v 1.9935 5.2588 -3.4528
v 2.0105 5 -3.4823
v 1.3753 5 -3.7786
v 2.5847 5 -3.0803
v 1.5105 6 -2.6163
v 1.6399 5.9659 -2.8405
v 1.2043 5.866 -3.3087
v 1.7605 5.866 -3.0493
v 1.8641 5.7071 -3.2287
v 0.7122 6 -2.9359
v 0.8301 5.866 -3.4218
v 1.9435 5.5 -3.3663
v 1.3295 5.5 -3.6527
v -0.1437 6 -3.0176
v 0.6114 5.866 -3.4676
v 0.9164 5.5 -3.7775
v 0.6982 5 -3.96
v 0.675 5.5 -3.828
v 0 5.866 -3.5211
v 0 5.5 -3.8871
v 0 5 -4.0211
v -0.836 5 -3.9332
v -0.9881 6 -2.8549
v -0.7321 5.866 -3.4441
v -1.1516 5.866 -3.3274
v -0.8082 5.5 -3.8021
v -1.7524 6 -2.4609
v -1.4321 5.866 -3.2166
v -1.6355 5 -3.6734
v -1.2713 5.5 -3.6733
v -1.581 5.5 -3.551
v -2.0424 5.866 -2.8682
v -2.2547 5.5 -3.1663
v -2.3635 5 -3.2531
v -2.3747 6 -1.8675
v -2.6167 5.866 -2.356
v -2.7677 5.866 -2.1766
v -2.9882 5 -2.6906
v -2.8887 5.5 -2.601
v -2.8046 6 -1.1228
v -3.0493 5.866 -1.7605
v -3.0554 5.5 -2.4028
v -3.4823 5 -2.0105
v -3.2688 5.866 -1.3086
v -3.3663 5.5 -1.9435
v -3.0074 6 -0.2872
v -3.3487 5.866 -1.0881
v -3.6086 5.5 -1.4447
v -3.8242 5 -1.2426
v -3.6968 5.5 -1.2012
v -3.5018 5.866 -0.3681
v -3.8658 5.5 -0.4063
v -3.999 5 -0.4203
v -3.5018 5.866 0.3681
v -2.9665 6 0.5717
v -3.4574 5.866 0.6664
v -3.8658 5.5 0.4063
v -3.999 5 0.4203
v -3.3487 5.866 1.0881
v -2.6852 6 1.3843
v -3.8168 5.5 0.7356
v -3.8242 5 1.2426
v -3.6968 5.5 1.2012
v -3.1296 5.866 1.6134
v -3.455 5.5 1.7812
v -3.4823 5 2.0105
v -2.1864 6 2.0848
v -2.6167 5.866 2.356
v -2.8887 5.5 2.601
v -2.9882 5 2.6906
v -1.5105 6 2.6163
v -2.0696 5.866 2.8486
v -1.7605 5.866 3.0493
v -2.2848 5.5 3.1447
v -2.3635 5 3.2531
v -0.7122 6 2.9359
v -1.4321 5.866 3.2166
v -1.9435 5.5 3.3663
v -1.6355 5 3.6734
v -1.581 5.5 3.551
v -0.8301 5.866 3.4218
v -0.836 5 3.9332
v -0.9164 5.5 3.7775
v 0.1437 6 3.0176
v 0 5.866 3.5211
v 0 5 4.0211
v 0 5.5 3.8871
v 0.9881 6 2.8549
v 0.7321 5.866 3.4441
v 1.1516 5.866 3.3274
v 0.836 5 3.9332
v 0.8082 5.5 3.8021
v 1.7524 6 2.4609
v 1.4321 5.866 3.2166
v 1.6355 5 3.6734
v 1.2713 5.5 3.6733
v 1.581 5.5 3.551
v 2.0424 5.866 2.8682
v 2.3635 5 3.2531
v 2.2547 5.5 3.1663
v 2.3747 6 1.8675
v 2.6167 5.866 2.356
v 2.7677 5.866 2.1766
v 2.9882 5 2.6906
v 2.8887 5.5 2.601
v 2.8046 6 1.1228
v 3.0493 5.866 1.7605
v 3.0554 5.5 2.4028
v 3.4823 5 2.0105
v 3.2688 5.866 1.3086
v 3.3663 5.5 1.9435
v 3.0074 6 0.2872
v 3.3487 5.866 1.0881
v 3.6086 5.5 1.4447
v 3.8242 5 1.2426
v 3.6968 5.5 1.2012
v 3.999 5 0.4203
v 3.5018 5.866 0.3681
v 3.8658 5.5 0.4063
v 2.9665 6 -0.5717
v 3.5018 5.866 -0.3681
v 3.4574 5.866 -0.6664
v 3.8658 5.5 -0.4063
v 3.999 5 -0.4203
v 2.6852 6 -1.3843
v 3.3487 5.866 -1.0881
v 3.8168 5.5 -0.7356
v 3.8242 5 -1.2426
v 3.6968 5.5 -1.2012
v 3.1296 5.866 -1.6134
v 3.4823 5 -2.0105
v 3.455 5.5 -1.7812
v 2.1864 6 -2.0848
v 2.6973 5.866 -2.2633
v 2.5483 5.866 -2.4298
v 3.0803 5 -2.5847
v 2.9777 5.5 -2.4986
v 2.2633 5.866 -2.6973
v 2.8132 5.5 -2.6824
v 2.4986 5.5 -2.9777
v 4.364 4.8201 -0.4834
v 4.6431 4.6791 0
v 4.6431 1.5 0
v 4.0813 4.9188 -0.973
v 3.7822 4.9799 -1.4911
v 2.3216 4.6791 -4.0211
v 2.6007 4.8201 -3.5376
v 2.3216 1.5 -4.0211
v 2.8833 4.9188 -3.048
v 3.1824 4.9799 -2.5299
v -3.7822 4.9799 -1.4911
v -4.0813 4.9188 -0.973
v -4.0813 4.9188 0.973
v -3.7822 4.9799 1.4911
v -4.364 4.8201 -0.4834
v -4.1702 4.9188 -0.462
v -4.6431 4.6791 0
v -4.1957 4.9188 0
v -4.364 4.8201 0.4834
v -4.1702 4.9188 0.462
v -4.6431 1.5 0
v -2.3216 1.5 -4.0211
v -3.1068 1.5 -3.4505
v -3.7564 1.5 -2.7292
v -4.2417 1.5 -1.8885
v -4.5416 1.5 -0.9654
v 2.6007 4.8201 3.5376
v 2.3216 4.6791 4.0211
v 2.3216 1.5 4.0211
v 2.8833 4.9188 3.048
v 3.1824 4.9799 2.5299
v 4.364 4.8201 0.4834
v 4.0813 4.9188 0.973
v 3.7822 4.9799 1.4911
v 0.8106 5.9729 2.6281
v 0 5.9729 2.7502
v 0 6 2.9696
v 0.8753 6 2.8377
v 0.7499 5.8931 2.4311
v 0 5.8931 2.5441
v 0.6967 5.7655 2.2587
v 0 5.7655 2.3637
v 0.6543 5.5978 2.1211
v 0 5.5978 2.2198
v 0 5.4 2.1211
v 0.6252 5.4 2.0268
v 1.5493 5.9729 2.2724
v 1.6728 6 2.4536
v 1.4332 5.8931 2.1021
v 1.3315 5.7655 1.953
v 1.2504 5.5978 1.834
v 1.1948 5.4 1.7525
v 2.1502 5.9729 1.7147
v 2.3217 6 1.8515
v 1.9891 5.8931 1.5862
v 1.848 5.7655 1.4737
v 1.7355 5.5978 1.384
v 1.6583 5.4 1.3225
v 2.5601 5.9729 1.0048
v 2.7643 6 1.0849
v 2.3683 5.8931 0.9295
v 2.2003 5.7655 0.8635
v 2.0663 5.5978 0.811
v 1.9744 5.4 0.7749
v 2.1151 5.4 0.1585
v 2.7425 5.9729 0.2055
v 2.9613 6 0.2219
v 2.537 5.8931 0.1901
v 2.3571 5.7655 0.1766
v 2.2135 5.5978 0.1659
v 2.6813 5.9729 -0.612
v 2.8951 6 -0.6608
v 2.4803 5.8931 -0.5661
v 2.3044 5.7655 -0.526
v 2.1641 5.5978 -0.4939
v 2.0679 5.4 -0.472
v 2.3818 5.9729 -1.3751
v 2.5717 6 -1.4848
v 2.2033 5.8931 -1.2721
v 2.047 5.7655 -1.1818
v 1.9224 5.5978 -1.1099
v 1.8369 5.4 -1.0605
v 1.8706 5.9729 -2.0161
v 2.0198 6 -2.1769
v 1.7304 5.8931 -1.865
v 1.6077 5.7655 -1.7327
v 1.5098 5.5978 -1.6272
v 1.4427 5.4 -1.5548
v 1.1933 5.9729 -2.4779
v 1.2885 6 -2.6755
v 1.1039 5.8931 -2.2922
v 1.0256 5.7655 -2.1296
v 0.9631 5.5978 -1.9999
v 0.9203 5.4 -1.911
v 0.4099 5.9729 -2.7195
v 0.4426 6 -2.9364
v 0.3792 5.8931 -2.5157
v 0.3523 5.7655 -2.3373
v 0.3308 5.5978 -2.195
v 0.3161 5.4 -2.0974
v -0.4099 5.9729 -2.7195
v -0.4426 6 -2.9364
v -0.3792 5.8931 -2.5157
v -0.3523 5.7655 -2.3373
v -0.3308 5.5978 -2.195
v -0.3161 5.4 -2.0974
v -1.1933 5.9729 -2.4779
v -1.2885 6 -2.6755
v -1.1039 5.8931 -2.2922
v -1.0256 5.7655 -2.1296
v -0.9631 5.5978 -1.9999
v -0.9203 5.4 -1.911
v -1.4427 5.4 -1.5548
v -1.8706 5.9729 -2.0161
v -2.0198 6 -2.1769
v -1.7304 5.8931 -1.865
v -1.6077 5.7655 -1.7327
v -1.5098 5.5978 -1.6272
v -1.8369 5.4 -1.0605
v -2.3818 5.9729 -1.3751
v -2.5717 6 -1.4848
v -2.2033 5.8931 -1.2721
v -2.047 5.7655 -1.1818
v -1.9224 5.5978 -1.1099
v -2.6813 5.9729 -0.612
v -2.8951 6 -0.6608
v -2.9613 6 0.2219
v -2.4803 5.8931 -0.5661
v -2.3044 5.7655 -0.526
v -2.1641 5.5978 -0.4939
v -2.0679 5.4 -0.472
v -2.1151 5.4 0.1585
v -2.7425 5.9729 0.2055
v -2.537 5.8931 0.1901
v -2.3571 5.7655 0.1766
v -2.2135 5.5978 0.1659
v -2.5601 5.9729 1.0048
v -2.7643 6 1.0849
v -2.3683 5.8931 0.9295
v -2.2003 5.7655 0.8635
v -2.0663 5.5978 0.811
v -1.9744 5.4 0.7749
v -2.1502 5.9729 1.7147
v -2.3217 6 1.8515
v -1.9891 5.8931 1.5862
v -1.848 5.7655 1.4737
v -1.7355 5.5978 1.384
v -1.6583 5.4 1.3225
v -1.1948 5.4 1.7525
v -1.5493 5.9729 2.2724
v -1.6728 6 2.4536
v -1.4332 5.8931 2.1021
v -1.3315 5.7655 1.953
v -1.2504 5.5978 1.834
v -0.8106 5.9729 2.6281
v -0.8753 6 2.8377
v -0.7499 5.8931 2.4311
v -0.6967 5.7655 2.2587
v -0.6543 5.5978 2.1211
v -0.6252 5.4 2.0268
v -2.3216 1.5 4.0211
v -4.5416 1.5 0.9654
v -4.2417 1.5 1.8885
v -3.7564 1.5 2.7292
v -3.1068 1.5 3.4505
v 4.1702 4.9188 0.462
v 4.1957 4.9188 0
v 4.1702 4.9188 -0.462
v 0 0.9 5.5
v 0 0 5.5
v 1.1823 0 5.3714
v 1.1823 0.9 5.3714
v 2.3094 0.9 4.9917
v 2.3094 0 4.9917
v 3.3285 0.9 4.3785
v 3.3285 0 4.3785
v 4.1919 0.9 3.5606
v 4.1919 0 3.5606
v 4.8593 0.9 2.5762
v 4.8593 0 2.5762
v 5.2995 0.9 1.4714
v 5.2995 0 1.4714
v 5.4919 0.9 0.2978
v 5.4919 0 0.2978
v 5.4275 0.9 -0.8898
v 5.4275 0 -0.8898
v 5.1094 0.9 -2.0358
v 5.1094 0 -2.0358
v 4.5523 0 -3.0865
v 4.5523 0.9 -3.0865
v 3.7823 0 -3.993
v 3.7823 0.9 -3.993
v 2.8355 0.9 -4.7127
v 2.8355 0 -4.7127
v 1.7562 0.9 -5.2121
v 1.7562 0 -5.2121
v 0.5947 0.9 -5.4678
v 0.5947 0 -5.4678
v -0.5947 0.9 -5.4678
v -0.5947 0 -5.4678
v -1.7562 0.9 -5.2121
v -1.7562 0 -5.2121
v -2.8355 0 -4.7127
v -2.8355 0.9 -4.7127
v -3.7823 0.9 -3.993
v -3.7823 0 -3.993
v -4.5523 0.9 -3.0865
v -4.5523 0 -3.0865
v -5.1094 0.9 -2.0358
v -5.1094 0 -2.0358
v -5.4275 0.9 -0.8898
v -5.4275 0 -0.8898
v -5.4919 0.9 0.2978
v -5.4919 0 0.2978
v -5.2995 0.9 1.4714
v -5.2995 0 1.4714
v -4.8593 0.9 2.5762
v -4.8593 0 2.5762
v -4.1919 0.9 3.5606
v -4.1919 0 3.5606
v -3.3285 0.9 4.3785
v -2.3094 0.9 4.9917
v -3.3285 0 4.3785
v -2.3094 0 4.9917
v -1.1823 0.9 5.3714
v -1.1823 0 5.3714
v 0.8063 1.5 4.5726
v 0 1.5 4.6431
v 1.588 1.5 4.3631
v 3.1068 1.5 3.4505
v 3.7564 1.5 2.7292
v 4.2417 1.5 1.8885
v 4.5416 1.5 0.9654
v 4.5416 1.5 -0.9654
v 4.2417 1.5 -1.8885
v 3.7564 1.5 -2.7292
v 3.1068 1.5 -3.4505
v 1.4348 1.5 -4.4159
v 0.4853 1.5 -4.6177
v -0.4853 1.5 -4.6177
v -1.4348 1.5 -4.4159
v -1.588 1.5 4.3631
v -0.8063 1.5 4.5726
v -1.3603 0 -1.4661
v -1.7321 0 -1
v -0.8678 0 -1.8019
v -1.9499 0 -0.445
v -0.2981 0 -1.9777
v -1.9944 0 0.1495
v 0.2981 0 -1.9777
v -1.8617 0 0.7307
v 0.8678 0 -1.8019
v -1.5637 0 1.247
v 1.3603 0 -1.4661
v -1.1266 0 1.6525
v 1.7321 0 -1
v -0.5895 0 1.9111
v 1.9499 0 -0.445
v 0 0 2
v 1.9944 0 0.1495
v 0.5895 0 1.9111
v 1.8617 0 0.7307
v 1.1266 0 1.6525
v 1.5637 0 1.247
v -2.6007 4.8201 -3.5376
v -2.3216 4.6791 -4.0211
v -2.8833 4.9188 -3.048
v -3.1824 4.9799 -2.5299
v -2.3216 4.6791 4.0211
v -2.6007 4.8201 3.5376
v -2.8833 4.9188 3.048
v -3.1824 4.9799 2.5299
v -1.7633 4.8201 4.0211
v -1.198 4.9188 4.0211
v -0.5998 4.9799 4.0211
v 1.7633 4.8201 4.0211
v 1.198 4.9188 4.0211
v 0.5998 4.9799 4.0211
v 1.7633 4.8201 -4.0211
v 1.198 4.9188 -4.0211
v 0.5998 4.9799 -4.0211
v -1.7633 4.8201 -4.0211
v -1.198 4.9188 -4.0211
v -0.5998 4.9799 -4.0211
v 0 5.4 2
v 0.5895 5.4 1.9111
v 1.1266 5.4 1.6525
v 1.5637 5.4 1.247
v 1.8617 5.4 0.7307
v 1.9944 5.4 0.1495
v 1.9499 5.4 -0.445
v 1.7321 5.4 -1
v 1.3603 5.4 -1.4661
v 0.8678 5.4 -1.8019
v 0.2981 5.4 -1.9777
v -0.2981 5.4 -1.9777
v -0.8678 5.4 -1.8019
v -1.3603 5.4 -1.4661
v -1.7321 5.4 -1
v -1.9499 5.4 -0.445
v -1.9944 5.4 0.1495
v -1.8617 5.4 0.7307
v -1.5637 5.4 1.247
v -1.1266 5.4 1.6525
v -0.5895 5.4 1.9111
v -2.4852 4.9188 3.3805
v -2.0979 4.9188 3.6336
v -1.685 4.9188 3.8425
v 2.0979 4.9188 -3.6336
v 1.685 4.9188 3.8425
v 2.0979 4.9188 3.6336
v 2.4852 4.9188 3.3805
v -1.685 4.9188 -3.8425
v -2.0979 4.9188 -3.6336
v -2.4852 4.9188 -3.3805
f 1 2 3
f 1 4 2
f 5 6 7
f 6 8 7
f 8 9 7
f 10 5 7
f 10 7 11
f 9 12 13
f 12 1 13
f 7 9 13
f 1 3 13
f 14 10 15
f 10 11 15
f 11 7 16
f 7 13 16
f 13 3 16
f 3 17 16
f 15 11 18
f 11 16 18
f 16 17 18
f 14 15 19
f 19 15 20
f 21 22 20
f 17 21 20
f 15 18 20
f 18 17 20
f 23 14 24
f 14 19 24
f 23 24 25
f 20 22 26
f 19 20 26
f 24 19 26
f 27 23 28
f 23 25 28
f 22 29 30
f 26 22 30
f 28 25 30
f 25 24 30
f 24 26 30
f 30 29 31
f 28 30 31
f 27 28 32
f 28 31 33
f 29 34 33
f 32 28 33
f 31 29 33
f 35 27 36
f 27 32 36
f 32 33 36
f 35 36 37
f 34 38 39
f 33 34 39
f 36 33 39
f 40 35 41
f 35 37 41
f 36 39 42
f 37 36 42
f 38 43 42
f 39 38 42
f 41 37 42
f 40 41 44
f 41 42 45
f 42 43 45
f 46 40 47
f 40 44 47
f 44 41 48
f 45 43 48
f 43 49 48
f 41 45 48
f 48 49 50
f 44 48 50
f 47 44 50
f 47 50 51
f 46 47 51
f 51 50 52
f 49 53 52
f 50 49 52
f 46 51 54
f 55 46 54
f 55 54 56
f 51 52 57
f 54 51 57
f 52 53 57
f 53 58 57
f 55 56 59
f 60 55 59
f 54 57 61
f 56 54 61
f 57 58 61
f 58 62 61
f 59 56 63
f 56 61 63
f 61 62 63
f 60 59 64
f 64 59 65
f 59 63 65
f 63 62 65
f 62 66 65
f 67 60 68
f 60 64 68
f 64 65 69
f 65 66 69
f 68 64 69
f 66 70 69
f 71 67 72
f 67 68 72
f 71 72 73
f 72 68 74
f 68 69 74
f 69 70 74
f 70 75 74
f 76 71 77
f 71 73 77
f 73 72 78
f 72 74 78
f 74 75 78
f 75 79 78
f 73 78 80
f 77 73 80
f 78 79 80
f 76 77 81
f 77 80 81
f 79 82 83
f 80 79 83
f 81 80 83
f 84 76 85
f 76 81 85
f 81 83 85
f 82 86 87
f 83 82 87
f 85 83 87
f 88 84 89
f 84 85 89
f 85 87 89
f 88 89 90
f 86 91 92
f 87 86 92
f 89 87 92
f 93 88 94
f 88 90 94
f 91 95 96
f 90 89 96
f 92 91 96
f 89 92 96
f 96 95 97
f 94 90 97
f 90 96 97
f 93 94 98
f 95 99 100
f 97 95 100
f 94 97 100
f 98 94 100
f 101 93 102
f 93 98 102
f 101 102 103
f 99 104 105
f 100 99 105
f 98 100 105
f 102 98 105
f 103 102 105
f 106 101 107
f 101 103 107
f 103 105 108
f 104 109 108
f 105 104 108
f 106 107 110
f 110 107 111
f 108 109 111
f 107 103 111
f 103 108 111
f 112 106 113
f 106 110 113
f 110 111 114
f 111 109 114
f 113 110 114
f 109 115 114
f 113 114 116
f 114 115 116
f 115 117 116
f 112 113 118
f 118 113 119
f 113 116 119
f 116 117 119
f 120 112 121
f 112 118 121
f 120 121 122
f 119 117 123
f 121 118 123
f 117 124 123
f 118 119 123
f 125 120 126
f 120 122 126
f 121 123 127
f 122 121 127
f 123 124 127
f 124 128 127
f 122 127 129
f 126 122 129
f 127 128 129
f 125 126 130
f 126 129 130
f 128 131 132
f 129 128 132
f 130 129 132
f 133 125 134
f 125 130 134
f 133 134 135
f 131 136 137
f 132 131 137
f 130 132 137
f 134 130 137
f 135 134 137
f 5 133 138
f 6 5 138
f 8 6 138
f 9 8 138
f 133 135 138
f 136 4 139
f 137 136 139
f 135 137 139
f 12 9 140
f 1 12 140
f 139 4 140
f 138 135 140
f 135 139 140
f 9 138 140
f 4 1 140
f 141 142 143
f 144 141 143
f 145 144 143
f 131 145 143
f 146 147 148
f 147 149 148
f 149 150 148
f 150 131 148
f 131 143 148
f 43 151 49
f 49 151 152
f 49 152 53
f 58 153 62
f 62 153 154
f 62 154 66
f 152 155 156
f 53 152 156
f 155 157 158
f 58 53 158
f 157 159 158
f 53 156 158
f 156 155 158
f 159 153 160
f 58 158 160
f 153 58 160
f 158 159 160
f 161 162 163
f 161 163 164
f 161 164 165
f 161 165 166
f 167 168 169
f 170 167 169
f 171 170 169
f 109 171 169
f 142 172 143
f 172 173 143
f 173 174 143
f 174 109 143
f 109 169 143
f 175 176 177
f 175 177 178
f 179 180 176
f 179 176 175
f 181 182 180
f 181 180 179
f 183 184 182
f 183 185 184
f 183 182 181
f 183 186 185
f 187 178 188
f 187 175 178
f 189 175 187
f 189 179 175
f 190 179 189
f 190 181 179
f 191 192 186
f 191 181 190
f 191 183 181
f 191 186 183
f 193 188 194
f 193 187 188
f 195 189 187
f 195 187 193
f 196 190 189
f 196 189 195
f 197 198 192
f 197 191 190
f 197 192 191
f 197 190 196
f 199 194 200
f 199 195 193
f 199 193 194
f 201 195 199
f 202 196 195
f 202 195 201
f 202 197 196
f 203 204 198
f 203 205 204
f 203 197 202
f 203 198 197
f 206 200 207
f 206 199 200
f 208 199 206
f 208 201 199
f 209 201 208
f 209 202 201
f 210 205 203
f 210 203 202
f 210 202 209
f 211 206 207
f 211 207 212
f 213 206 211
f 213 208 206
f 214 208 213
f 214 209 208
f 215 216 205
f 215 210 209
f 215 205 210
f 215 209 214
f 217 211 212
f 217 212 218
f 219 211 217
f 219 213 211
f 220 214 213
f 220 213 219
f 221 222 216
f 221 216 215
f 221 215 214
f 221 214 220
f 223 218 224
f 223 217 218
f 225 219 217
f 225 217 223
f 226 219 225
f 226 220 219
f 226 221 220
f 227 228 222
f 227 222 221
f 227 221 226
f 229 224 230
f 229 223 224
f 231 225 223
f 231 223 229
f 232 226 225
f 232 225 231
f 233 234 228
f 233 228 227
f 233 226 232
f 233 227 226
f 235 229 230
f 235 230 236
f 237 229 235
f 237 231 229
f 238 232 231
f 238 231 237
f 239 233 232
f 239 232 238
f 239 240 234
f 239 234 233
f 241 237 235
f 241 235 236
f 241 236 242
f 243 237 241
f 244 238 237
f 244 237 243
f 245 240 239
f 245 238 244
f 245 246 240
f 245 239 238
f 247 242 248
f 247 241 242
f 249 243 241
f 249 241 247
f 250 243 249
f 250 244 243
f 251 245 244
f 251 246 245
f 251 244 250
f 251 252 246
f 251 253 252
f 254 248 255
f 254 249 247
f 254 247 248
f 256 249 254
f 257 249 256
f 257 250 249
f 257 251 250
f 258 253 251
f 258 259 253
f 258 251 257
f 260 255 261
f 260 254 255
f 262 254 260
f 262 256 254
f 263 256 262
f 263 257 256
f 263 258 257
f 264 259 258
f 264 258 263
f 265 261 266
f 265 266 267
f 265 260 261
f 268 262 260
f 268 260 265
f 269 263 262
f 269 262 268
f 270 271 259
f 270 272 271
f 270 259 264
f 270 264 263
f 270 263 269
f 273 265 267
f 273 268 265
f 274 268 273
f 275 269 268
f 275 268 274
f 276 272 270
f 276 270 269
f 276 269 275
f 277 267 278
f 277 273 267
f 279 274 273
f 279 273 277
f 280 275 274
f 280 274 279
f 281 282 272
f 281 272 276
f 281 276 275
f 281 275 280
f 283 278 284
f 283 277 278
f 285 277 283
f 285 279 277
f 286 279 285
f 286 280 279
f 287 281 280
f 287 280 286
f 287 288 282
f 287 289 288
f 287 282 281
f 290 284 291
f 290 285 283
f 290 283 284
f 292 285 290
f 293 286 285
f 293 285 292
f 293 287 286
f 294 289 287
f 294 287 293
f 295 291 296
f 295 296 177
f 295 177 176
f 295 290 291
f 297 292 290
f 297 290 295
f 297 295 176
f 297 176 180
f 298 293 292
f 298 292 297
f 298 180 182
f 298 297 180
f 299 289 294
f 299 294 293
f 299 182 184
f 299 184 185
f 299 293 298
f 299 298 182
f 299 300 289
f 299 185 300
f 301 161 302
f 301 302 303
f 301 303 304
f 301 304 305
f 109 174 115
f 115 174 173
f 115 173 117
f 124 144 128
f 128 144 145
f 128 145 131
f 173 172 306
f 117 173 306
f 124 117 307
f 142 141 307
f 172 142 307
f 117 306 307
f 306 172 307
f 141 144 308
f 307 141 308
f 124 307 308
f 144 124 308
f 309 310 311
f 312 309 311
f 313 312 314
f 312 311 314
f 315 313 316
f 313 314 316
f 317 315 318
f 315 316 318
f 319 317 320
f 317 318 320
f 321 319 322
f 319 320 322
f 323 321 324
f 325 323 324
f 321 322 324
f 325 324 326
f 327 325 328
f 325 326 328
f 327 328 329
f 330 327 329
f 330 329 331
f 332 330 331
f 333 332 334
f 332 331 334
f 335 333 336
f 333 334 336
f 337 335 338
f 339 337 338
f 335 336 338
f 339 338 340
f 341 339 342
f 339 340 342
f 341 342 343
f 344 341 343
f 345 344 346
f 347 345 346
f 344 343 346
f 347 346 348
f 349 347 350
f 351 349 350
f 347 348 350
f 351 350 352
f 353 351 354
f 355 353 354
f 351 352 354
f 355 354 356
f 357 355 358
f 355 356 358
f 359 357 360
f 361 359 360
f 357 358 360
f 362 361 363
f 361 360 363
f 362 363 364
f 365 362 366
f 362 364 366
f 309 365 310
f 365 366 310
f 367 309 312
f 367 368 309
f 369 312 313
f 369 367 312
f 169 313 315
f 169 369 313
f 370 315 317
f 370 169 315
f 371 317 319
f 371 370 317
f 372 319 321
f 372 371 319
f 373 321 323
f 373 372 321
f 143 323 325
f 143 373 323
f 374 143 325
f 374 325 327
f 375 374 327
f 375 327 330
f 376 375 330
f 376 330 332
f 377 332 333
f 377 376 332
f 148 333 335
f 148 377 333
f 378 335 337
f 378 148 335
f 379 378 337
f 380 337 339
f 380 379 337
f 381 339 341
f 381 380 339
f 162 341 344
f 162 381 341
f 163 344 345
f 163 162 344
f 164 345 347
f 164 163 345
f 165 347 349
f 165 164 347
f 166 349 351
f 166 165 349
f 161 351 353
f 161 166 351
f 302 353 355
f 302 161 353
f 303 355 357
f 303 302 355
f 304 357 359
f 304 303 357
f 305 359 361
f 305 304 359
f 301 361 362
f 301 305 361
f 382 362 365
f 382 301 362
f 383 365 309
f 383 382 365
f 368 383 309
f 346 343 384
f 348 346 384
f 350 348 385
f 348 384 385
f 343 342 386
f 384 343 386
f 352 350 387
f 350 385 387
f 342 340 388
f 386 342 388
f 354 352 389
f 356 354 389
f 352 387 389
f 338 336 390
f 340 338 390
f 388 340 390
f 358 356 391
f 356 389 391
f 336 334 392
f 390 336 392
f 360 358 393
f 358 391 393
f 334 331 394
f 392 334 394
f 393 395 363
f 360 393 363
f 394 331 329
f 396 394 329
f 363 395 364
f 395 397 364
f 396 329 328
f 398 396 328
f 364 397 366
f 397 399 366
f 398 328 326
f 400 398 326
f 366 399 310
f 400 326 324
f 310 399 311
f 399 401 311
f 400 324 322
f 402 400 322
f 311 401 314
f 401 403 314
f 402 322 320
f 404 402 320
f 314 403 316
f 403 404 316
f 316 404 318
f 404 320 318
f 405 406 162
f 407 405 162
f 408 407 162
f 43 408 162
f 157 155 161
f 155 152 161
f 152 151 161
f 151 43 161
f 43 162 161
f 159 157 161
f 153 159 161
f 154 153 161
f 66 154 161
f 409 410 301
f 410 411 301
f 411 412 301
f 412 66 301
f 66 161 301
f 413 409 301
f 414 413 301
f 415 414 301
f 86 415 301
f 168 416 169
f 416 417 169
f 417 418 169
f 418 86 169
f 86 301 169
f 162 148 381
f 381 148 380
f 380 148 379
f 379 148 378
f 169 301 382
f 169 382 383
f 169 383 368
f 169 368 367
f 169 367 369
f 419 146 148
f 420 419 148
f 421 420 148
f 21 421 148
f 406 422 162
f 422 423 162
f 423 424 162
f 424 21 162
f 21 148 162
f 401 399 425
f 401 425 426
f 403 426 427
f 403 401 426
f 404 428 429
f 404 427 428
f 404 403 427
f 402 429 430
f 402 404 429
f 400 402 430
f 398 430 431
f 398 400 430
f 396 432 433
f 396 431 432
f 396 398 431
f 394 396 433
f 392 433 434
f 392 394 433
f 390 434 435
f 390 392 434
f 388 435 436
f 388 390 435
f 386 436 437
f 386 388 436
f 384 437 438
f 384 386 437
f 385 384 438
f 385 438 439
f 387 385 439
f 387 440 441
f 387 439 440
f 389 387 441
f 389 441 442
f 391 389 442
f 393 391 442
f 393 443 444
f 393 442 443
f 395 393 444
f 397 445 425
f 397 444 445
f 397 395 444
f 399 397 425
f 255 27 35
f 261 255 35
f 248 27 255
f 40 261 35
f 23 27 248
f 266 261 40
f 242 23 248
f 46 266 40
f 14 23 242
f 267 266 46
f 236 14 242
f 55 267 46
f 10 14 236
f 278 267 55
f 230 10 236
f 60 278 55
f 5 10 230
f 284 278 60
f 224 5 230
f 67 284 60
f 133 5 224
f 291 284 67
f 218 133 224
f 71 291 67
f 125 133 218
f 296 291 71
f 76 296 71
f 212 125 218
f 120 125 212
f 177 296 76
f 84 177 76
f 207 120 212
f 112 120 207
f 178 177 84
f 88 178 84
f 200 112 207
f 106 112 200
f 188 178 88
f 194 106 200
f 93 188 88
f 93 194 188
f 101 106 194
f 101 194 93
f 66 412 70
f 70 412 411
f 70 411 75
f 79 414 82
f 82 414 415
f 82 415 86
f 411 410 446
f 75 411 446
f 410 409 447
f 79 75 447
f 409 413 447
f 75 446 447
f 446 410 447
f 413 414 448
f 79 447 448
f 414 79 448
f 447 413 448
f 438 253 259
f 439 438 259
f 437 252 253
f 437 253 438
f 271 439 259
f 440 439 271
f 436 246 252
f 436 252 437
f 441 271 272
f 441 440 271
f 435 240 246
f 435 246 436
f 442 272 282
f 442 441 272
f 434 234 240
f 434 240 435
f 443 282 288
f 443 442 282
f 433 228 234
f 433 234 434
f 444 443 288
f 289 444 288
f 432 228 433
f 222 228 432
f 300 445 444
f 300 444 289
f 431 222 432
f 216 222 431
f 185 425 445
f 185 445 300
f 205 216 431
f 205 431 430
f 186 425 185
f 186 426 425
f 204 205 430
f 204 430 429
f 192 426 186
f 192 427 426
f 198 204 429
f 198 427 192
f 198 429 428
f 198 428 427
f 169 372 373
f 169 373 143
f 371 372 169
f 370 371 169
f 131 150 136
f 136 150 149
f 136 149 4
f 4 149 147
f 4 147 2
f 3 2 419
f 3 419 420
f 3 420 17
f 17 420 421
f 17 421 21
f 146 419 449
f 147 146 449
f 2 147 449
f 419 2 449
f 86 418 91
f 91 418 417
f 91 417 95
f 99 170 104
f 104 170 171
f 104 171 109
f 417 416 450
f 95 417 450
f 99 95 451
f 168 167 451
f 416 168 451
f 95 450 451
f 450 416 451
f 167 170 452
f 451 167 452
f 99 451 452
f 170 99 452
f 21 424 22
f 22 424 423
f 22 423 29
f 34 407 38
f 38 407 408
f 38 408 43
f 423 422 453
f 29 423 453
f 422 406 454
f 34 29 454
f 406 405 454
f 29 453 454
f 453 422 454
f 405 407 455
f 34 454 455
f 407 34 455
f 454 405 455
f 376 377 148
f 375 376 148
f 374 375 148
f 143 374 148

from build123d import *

# Parameters (mm, degrees)
SKETCH1_R               = 5.5
BOSS_EXTRUDE1_DEPTH     = 1.5
CHAMFER1_SIZE           = 0.6
CHAMFER1_SIZE2          = 0.856888804
BOSS_EXTRUDE2_DEPTH     = 3.5
SKETCH3_R               = 4.021052248
BOSS_EXTRUDE3_DEPTH     = 1
SKETCH5_R               = 2.121052248
CUT_EXTRUDE1_DEPTH      = 0.6
FILLET1_R               = 0.9
CUT_EXTRUDE2_DEPTH      = 10.468896451
CUT_EXTRUDE2_DEPTH_BACK = 10.468896451
SKETCH6_R               = 2


with BuildPart() as part:
    # Sketch1 → Boss-Extrude1 (new body)
    with BuildSketch(Plane(origin=(0, 0, 0), x_dir=(1, 0, 0), z_dir=(0, 1, 0))):
        with Locations(Location((0, 0, 0), (0, 0, 270))):
            Circle(SKETCH1_R)
    extrude(amount=BOSS_EXTRUDE1_DEPTH)

    # Chamfer1
    chamfer1_edges = [part.edges().sort_by_distance(p)[0] for p in [
        (0, 1.5, -5.5),
    ]]
    chamfer1_side = [part.faces().sort_by_distance(p)[0] for p in [
        (0, 0.75, -5.5),
    ]]
    chamfer(chamfer1_edges, length=CHAMFER1_SIZE, length2=CHAMFER1_SIZE2, reference=chamfer1_side[0])

    # Sketch2 → Boss-Extrude2 (add)
    with BuildSketch(Plane(origin=(0, 1.5, 0), x_dir=(1, 0, 0), z_dir=(0, 1, 0))):
        Polygon((4.643111196, 0), (2.321555598, 4.021052248), (-2.321555598, 4.021052248), (-4.643111196, 0), (-2.321555598, -4.021052248), (2.321555598, -4.021052248), align=None)
    extrude(amount=BOSS_EXTRUDE2_DEPTH)

    # Sketch3 → Boss-Extrude3 (add)
    with BuildSketch(Plane(origin=(0, 5, 0), x_dir=(1, 0, 0), z_dir=(0, 1, 0))):
        with Locations(Location((0, 0, 0), (0, 0, 270))):
            Circle(SKETCH3_R)
    extrude(amount=BOSS_EXTRUDE3_DEPTH)

    # Sketch4 → Cut-Revolve1 (revolve, cut)
    with BuildSketch(Plane.XY, mode=Mode.PRIVATE) as cut_revolve1_sk:
        with BuildLine():
            Line((6.63749378, 2.793667141), (6.63749378, 7.491604904))
            Line((6.63749378, 7.491604904), (3.021052248, 7.491604904))
            Line((3.021052248, 7.491604904), (3.021052248, 6))
            ThreePointArc((3.021052248, 6), (3.728159029, 5.707106781), (4.021052248, 5))
            ThreePointArc((4.021052248, 5), (5.485320065, 4.081886331), (6.63749378, 2.793667141))
        make_face()
    revolve(cut_revolve1_sk.sketch.rotate(Axis((0, 6, 0), (0, 1, 0)), 60), axis=Axis((0, 6, 0), (0, 1, 0)), mode=Mode.SUBTRACT)

    # Sketch5 → Cut-Extrude1 (cut)
    with BuildSketch(Plane(origin=(0, 6, 0), x_dir=(1, 0, 0), z_dir=(0, 1, 0))):
        with Locations(Location((0, 0, 0), (0, 0, 270))):
            Circle(SKETCH5_R)
    extrude(amount=-CUT_EXTRUDE1_DEPTH, mode=Mode.SUBTRACT)

    # Fillet1
    # the kernel refuses this fillet: 0.9 mm, written as the material it takes off along each edge
    with BuildSketch(Plane(origin=(0, 6, 0), x_dir=(0, 0, 1), z_dir=(-1, 0, 0))) as fillet1_piece_1:
        with BuildLine():
            CenterArc((2.969580386, -0.9), FILLET1_R, 90, 70.528779366)
            Line((2.121052248, -0.6), (2.104081686, -0.594))
            ThreePointArc((2.104081686, -0.594), (2.103052248, -0.3), (2.103052248, 0))
            Line((2.103052248, 0), (2.121052248, 0.018))
            Line((2.121052248, 0.018), (2.969580386, 0.018))
            Line((2.969580386, 0.018), (2.969580386, 0))
        make_face()
    revolve(axis=Axis((0, 6, 0), (0, 1, 0)), mode=Mode.SUBTRACT)

    # Sketch6 → Cut-Extrude2 (cut, two sides: drawn at the far end of the back side and taken through both)
    with BuildSketch(Plane(origin=(0, 5.4, 0), x_dir=(1, 0, 0), z_dir=(0, 1, 0)).offset(-CUT_EXTRUDE2_DEPTH_BACK)):
        with Locations(Location((0, 0, 0), (0, 0, 270))):
            Circle(SKETCH6_R)
    extrude(amount=CUT_EXTRUDE2_DEPTH + CUT_EXTRUDE2_DEPTH_BACK, mode=Mode.SUBTRACT)


solid = part.part
